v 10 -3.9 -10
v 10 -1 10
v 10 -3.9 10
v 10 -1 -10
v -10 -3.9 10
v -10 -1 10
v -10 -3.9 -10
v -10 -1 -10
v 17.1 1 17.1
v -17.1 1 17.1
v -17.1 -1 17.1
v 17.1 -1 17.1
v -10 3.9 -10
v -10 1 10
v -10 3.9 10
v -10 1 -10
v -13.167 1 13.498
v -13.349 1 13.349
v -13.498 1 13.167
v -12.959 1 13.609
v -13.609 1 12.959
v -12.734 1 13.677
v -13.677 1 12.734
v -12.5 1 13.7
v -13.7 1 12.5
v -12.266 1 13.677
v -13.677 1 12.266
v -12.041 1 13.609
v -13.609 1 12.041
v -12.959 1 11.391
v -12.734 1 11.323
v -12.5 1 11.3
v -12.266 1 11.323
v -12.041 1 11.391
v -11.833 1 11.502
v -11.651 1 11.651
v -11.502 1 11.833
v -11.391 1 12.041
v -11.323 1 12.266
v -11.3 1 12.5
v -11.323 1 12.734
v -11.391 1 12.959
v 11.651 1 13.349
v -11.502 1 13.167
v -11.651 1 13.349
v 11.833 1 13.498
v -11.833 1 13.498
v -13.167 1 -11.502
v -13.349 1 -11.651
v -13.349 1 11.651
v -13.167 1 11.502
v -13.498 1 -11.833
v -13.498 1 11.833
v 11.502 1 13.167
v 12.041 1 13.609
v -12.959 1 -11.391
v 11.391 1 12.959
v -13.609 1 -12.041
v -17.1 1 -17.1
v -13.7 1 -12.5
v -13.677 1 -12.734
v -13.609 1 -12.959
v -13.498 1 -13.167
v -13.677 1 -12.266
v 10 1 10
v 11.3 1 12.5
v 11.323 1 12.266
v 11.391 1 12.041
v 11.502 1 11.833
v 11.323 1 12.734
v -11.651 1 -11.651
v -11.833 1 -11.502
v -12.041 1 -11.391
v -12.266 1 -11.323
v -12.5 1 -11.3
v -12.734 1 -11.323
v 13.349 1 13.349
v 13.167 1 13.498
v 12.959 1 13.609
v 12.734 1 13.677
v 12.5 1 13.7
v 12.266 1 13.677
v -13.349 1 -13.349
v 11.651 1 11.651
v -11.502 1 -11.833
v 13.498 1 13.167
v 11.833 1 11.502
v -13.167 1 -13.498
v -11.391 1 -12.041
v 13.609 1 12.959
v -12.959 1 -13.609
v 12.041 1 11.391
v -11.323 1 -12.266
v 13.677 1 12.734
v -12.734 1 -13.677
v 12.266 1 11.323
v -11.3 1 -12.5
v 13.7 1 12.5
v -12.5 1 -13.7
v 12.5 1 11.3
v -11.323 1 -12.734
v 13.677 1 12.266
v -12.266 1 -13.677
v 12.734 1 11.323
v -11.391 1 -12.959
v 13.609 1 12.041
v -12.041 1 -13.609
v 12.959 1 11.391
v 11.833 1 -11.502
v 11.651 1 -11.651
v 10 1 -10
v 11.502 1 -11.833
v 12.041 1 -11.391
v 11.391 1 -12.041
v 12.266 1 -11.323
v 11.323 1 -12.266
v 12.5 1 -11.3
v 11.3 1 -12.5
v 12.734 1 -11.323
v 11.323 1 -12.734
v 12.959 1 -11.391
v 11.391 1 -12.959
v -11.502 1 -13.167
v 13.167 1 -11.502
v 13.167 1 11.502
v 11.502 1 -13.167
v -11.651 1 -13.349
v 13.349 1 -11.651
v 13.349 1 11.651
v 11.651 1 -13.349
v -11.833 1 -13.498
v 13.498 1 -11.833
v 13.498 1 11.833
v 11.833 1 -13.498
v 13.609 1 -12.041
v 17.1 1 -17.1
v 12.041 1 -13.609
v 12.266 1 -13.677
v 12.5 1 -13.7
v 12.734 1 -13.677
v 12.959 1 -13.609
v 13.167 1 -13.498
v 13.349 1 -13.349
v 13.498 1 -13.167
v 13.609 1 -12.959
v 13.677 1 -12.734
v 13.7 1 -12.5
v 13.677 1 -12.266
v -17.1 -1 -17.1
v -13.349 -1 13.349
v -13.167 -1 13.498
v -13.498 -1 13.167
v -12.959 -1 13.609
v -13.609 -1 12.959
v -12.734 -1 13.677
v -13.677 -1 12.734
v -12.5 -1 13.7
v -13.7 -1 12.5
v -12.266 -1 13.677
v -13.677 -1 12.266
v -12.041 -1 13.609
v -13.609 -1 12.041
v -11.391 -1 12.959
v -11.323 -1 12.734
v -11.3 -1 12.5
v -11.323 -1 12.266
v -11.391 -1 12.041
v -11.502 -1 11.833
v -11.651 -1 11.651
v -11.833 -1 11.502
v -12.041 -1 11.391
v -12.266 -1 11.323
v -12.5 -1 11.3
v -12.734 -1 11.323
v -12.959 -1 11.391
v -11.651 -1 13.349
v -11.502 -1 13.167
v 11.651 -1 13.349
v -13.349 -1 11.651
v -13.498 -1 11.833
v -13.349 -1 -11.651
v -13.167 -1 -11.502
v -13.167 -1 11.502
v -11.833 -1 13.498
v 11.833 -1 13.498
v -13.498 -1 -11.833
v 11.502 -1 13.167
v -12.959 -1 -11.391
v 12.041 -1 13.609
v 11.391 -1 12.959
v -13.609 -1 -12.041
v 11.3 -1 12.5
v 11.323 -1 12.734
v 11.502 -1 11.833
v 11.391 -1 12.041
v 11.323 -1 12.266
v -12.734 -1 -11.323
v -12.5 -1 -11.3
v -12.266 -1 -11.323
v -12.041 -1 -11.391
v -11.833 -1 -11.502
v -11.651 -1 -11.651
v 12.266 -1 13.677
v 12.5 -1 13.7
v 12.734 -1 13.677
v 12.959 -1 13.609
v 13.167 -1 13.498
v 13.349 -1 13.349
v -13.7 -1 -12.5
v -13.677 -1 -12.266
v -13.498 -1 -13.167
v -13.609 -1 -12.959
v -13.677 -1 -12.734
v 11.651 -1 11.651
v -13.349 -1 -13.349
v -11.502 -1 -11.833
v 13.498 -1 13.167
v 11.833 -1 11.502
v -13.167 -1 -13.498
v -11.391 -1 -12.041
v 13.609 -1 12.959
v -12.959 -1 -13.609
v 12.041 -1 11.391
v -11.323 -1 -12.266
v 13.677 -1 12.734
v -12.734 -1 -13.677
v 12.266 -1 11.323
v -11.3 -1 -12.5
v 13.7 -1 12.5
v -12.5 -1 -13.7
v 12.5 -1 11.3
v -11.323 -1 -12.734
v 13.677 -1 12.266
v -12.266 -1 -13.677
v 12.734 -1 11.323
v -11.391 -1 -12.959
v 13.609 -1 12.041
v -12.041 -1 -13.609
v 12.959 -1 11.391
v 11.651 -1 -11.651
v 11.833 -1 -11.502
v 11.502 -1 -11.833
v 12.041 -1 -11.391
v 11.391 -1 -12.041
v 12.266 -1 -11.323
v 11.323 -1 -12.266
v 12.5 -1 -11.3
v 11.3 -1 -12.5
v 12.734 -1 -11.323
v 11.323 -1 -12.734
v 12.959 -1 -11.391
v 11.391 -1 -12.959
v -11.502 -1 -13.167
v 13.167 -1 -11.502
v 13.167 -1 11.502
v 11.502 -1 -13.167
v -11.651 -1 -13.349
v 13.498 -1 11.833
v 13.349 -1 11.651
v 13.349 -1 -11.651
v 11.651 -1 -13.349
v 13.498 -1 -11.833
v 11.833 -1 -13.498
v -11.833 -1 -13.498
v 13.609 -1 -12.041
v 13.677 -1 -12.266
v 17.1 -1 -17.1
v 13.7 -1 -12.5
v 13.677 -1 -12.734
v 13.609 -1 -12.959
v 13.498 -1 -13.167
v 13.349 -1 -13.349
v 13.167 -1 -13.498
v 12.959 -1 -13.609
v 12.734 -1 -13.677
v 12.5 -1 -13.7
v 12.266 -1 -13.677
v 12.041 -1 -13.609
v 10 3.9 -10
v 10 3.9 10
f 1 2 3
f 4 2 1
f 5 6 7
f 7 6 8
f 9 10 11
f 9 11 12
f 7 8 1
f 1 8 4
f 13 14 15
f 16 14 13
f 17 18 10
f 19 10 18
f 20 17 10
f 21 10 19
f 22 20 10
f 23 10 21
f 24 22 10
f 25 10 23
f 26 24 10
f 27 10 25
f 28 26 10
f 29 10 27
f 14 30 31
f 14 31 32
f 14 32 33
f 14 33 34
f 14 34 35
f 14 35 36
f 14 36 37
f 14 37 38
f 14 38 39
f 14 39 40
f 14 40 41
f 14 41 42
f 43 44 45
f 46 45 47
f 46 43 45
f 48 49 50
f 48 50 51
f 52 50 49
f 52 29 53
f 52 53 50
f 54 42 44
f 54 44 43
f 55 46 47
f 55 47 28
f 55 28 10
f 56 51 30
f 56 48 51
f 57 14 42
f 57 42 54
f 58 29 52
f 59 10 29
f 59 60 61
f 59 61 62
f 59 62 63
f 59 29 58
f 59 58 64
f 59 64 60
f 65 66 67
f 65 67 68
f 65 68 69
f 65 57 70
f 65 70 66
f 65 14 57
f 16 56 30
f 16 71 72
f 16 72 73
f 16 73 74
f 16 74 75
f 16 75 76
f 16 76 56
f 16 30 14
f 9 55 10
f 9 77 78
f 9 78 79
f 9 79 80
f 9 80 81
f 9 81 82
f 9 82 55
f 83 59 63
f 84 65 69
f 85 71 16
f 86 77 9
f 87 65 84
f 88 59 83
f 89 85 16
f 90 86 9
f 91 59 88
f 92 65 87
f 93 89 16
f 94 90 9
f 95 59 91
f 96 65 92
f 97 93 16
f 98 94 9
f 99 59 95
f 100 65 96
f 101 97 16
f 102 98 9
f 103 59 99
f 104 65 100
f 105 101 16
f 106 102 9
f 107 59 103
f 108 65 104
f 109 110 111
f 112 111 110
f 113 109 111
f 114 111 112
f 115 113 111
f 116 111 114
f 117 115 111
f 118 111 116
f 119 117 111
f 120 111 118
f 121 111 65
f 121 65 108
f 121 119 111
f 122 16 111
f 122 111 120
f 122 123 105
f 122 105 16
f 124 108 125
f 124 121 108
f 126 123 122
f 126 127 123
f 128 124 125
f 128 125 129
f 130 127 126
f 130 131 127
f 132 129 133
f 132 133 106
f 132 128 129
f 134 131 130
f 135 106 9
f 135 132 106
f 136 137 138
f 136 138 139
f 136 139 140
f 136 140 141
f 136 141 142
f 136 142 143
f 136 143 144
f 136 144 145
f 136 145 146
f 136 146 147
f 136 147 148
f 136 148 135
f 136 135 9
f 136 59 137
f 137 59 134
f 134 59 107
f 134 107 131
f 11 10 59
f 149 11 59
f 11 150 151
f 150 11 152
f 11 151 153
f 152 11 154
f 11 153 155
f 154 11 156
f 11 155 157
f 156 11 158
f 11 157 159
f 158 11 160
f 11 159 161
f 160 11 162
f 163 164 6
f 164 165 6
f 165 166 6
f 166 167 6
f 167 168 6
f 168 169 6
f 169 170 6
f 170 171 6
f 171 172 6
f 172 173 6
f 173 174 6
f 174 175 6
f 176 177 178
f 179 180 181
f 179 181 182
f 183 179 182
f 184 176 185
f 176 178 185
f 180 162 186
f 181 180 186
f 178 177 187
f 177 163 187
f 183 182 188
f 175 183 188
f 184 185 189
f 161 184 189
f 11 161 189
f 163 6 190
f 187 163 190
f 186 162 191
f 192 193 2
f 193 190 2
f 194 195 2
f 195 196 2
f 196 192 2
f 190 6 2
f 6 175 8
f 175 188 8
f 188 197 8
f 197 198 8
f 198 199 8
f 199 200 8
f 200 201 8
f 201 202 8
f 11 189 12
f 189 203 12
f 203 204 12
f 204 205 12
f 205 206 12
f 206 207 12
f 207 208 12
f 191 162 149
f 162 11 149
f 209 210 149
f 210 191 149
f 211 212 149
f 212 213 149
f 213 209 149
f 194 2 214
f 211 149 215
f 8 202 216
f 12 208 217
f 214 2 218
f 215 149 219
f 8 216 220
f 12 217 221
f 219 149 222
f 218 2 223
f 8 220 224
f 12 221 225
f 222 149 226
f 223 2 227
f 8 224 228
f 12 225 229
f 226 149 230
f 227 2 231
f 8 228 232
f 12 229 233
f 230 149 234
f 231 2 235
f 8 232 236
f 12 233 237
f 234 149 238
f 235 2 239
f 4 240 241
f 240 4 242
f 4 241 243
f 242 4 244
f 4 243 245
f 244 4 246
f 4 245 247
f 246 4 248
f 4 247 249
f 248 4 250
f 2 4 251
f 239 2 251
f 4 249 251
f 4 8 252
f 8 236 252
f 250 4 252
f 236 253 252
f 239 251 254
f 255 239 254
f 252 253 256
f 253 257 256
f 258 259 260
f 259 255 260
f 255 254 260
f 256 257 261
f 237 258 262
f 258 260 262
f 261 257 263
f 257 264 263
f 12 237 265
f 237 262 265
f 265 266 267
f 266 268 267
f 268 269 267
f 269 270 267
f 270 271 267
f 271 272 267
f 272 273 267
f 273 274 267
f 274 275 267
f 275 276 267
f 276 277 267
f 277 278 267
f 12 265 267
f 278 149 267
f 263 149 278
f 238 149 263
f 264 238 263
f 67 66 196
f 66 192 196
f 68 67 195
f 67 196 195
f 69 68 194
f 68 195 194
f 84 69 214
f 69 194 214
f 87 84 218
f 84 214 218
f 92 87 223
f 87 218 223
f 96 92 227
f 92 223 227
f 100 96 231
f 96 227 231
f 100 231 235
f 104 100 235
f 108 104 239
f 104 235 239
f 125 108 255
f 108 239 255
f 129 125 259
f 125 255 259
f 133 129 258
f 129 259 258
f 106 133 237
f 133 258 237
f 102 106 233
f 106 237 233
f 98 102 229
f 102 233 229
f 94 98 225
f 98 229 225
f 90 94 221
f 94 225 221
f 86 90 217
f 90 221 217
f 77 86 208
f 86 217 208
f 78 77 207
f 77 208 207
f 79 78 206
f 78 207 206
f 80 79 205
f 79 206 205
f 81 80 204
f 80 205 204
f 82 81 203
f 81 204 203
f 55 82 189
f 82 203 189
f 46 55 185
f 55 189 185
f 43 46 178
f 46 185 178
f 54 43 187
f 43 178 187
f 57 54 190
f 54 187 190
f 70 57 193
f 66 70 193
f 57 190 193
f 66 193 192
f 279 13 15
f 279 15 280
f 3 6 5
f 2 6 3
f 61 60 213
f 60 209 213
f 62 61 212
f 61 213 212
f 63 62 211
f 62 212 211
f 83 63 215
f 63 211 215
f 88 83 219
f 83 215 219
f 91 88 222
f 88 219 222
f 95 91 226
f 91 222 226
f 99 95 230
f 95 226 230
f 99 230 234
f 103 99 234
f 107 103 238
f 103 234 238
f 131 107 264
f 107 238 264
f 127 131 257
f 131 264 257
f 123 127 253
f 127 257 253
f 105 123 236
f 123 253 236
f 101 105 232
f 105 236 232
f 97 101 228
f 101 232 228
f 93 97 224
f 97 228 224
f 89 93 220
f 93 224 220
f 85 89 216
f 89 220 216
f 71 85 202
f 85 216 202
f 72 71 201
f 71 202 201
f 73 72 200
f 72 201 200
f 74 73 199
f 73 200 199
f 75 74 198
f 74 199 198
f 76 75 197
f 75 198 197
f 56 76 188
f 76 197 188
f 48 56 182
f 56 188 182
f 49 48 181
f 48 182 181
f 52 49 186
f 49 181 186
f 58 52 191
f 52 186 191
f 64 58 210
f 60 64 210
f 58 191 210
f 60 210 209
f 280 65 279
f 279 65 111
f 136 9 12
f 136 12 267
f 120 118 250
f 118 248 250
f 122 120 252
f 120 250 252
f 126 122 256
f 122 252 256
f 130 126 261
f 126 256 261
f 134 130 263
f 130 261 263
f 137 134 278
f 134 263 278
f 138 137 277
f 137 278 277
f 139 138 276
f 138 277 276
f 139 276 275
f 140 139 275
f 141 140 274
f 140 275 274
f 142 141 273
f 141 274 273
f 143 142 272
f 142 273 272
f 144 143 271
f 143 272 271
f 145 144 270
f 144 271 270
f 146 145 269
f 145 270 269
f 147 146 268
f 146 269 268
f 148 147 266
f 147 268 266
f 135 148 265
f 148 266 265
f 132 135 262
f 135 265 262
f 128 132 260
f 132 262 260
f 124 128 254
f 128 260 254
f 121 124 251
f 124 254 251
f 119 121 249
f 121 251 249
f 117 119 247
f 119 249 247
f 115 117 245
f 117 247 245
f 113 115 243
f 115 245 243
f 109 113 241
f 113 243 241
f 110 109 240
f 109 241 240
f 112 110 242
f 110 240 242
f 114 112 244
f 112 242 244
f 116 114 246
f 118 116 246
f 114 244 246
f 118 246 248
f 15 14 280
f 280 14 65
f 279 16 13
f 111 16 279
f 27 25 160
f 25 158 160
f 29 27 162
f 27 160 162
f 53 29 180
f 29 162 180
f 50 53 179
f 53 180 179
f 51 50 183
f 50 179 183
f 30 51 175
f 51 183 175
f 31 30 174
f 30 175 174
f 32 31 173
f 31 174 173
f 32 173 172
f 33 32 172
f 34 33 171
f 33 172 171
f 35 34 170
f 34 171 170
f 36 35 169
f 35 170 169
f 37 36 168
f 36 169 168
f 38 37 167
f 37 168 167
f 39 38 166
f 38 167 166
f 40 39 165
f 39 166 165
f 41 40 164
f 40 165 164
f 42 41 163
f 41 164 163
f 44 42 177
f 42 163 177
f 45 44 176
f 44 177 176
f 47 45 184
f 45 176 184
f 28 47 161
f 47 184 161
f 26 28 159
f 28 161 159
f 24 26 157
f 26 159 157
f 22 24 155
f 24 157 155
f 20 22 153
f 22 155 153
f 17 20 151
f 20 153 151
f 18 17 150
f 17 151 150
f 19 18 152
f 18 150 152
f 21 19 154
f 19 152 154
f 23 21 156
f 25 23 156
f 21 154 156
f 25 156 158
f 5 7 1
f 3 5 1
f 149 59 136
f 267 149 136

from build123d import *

# Parameters (mm, degrees)
SKETCH1_W            = 34.2
SKETCH1_H            = 34.2
BOSS_EXTRUDE1_DEPTH  = 3.9
M2_CLEARANCE_HOLE1_D = 2.4
CUT_EXTRUDE1_START   = -2.9
SKETCH9_W            = 34.2
SKETCH9_H            = 34.2
SKETCH9_R            = 1.2
SKETCH9_W_2          = 20
SKETCH9_H_2          = 20
CUT_EXTRUDE1_DEPTH   = 2.9


with BuildPart() as part:
    # Sketch1 → Boss-Extrude1 (new, symmetric)
    with BuildSketch(Plane(origin=(0, 0, 0), x_dir=(1, 0, 0), z_dir=(0, 1, 0))):
        Rectangle(SKETCH1_W, SKETCH1_H)
    extrude(amount=BOSS_EXTRUDE1_DEPTH, both=True)

    # M2 Clearance Hole1 (through all)
    with Locations(Plane(origin=(0, 3.9, 0), x_dir=(1, 0, 0), z_dir=(0, 1, 0))):
        with Locations((-12.5, 12.5), (12.5, -12.5), (12.5, 12.5), (-12.5, -12.5)):
            Hole(M2_CLEARANCE_HOLE1_D / 2)

    # Sketch9 → Cut-Extrude1 (cut)
    with BuildSketch(Plane(origin=(0, 3.9, 0), x_dir=(1, 0, 0), z_dir=(0, 1, 0)).offset(CUT_EXTRUDE1_START)):
        Rectangle(SKETCH9_W, SKETCH9_H)
        with Locations(Location((12.5, -12.5, 0), (0, 0, 270))):
            Circle(SKETCH9_R, mode=Mode.SUBTRACT)
        with Locations(Location((-12.5, -12.5, 0), (0, 0, 270))):
            Circle(SKETCH9_R, mode=Mode.SUBTRACT)
        with Locations(Location((12.5, 12.5, 0), (0, 0, 270))):
            Circle(SKETCH9_R, mode=Mode.SUBTRACT)
        with Locations(Location((-12.5, 12.5, 0), (0, 0, 270))):
            Circle(SKETCH9_R, mode=Mode.SUBTRACT)
        Rectangle(SKETCH9_W_2, SKETCH9_H_2, mode=Mode.SUBTRACT)
    cut_extrude1 = extrude(amount=CUT_EXTRUDE1_DEPTH, mode=Mode.SUBTRACT)

    # Mirror1: Cut-Extrude1 across plane
    add(cut_extrude1.mirror(Plane.ZX), mode=Mode.SUBTRACT)


solid = part.part
